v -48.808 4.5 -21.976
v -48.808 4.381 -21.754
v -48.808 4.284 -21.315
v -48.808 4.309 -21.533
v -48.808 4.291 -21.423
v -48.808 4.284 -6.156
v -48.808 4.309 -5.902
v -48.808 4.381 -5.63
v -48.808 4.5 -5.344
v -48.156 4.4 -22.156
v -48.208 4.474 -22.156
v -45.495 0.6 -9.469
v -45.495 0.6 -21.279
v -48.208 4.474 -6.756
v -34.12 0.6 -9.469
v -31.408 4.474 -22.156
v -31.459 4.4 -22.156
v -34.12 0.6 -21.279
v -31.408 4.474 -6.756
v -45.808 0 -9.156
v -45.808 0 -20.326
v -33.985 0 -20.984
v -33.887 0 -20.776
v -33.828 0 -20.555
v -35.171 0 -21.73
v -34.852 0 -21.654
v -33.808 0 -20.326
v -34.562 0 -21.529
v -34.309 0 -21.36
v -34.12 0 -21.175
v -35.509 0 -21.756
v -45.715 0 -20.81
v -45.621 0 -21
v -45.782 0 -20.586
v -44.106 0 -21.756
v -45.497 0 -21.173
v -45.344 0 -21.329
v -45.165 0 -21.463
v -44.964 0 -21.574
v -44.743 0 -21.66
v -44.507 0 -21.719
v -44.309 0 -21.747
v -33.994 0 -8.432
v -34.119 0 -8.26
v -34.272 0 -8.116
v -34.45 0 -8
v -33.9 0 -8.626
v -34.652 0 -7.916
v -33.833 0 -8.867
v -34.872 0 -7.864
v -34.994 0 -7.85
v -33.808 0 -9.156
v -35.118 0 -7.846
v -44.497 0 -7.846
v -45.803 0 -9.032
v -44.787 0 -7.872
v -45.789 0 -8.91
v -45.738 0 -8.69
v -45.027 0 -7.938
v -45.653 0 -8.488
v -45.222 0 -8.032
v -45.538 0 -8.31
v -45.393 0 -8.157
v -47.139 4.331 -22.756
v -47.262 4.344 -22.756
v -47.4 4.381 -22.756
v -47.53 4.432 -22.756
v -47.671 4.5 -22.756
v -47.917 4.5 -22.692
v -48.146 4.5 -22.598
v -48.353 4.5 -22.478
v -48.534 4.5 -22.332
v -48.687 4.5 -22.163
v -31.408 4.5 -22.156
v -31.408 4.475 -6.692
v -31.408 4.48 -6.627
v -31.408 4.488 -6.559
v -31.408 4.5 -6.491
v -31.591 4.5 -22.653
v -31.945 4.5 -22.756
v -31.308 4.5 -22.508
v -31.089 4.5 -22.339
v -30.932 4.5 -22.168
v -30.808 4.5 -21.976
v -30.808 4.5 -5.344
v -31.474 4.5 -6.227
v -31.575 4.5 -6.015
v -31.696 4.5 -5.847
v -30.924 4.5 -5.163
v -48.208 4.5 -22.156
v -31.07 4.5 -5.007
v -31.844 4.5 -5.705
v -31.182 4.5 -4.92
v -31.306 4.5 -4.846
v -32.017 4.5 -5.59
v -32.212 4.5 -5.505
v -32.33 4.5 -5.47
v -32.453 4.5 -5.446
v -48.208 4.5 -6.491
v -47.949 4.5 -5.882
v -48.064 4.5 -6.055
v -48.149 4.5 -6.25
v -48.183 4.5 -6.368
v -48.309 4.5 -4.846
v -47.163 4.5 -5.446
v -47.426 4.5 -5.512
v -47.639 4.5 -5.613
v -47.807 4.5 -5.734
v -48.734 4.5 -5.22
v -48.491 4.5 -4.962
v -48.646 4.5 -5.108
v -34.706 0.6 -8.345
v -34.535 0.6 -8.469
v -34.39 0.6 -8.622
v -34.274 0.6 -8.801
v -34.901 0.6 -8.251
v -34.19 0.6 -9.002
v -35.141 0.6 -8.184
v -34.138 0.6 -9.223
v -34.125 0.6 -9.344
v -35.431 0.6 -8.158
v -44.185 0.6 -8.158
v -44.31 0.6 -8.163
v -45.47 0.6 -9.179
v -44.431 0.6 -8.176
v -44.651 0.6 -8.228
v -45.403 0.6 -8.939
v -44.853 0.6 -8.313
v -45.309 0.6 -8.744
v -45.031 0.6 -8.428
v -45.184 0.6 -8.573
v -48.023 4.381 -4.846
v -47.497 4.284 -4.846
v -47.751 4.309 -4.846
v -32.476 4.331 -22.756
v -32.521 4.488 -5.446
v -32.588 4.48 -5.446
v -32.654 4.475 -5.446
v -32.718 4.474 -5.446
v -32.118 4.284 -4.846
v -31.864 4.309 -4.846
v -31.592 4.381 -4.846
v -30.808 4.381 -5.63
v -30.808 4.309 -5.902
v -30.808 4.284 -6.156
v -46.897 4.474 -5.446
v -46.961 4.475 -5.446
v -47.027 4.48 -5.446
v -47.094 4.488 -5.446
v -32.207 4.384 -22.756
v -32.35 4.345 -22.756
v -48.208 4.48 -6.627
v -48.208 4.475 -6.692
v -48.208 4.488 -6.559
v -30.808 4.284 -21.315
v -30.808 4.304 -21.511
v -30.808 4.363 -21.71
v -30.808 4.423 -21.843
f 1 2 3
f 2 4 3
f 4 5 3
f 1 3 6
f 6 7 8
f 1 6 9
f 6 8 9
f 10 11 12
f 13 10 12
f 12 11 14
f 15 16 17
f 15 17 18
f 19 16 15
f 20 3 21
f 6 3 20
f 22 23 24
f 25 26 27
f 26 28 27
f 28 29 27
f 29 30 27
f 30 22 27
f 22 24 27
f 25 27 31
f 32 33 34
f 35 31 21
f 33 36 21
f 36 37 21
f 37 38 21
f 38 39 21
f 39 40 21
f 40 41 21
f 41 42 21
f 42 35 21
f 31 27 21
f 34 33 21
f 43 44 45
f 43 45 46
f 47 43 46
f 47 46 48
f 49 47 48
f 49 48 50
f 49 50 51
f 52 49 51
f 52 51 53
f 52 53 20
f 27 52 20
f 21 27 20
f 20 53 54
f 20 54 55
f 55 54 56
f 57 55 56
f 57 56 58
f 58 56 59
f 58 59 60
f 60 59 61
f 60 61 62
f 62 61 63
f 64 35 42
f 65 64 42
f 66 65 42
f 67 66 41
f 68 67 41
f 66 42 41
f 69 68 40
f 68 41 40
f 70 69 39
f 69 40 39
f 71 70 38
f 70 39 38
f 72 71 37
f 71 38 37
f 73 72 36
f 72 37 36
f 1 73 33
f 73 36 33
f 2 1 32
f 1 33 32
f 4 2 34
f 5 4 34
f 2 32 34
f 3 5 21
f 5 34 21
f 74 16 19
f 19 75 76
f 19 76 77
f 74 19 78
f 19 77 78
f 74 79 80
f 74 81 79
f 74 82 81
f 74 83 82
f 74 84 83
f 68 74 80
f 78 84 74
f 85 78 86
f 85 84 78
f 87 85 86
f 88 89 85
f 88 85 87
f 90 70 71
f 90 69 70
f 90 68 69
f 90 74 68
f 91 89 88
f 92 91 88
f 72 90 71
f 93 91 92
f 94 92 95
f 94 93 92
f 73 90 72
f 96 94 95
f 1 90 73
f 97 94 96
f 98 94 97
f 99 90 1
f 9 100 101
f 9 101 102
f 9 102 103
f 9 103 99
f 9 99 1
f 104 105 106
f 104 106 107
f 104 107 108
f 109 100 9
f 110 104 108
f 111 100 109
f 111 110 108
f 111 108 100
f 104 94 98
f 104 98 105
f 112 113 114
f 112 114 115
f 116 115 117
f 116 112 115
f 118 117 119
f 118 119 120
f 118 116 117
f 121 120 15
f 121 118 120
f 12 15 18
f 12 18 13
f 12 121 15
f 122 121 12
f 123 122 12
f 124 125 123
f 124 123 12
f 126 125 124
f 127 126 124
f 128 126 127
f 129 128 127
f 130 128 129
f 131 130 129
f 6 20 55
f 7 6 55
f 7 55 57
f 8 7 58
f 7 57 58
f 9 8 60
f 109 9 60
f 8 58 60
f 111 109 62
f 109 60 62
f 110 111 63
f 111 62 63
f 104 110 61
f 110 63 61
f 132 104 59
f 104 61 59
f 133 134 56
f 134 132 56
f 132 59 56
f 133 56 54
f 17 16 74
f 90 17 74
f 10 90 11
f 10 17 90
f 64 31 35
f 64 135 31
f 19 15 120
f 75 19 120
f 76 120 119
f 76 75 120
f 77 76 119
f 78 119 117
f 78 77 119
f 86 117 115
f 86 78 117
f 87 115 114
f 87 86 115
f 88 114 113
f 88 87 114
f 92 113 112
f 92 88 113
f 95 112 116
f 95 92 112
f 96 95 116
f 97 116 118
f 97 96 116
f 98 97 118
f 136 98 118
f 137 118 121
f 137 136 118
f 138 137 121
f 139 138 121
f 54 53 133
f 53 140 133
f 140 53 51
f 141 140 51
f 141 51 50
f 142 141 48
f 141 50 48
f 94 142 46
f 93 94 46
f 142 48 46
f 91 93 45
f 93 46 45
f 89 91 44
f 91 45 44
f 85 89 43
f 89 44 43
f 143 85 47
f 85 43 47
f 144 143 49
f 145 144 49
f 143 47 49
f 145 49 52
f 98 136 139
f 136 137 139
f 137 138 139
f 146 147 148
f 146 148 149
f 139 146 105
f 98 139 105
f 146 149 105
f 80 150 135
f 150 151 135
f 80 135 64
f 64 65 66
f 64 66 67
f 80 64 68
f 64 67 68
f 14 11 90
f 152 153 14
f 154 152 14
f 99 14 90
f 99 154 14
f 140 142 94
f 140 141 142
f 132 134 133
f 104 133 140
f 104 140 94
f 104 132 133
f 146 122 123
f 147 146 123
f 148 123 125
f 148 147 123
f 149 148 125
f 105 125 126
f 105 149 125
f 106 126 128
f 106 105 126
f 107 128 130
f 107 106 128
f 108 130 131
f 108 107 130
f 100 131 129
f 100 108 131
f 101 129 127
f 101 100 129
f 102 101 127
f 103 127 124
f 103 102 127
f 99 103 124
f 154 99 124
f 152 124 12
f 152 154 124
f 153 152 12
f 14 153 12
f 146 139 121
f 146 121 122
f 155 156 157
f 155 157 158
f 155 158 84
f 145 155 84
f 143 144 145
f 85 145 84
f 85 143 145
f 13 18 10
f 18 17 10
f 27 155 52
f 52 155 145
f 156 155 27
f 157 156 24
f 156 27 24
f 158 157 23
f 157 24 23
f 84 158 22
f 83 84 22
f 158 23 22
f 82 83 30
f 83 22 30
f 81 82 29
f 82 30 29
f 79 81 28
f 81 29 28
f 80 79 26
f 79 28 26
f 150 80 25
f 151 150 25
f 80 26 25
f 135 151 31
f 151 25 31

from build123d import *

# Parameters (mm, degrees)
SKETCH1_W            = 5.409999999999997
SKETCH1_H            = 5.409999999999997
SKETCH1_W_2          = 4.549942703341507
SKETCH1_H_2          = 4.549942703341509
SKETCH1_W_3          = 0.4399999999999977
BOSS_EXTRUDE8_DEPTH  = 8.9
SKETCH2_W            = 0.24999999999999645
SKETCH2_H            = 1.5849393526398075
SKETCH2_W_2          = 0.25
CUT_EXTRUDE1_DEPTH   = 1
SKETCH3_W            = 2.0000000000000036
SKETCH3_H            = 0.1681942632906388
BOSS_EXTRUDE9_DEPTH  = 0.44
BOSS_EXTRUDE10_DEPTH = 2
SKETCH6_W            = 3.0119840570828487
SKETCH6_H            = 5.999459520470431
CUT_EXTRUDE2_DEPTH   = 10
SKETCH8_W            = 9
SKETCH8_H            = 17.909999999999997
BOSS_EXTRUDE11_DEPTH = 4.5
CHAMFER3_SIZE        = 3
CHAMFER3_SIZE2       = 4.2844440202263625
CHAMFER4_SIZE        = 1
CHAMFER4_SIZE2       = 4.331475874284207
SKETCH12_W           = 8.408099926910044
SKETCH12_H           = 4.631365679829861
CUT_EXTRUDE3_DEPTH   = 30
SHELL6_T             = -0.6
FILLET1_R            = 1.6
FILLET4_R            = 1.6


# Read off the part's stored shape, not the designer's step: Mirror5
with BuildPart() as part:
    # Sketch1 → Boss-Extrude8 (new body)
    # profile 1 of 10: a face of its own
    with BuildSketch(Plane(origin=(0, 0, 0), x_dir=(1, 0, 0), z_dir=(0, 1, 0))):
        with Locations((-39.80770033929644, 14.55082776302726)):
            Rectangle(SKETCH1_W, SKETCH1_H)
        with Locations((-39.79772898762569, 14.560799114698018)):
            Rectangle(SKETCH1_W_2, SKETCH1_H_2, mode=Mode.SUBTRACT)
    # profile 2 of 10: a face of its own
    with BuildSketch(Plane(origin=(0, 0, 0), x_dir=(1, 0, 0), z_dir=(0, 1, 0))):
        with Locations((-39.80770033929644, 14.560799114698018)):
            Rectangle(SKETCH1_W_3, SKETCH1_H_2)
    # profile 3 of 10: a face of its own
    with BuildSketch(Plane(origin=(0, 0, 0), x_dir=(1, 0, 0), z_dir=(0, 1, 0))):
        with BuildLine():
            ThreePointArc((-42.09264304263795, 17.25582776302726), (-42.302671690967195, 17.47082776302726), (-42.51270033929644, 17.25582776302726))
            Line((-42.51270033929644, 17.25582776302726), (-42.09264304263795, 17.25582776302726))
        make_face()
    # profile 4 of 10: a face of its own
    with BuildSketch(Plane(origin=(0, 0, 0), x_dir=(1, 0, 0), z_dir=(0, 1, 0))):
        with BuildLine():
            ThreePointArc((-42.51270033929644, 17.255827763027263), (-42.72270033929644, 17.035827763027264), (-42.51270033929644, 16.815827763027265))
            Line((-42.51270033929644, 16.815827763027265), (-42.51270033929644, 17.25582776302726))
        make_face()
    # profile 5 of 10: a face of its own
    with BuildSketch(Plane(origin=(0, 0, 0), x_dir=(1, 0, 0), z_dir=(0, 1, 0))):
        with BuildLine():
            ThreePointArc((-42.51270033929644, 12.285827763027262), (-42.722700339296445, 12.065827763027261), (-42.51270033929644, 11.84582776302726))
            Line((-42.51270033929644, 11.845827763027263), (-42.51270033929644, 12.285827763027262))
        make_face()
    # profile 6 of 10: a face of its own
    with BuildSketch(Plane(origin=(0, 0, 0), x_dir=(1, 0, 0), z_dir=(0, 1, 0))):
        with BuildLine():
            Line((-42.09264304263795, 11.845827763027263), (-42.51270033929644, 11.845827763027263))
            ThreePointArc((-42.51270033929644, 11.845827763027263), (-42.302671690967195, 11.630827763027263), (-42.09264304263795, 11.845827763027263))
        make_face()
    # profile 7 of 10: a face of its own
    with BuildSketch(Plane(origin=(0, 0, 0), x_dir=(1, 0, 0), z_dir=(0, 1, 0))):
        with BuildLine():
            Line((-37.10270033929644, 11.845827763027263), (-37.522757635954925, 11.845827763027263))
            ThreePointArc((-37.522757635954925, 11.845827763027263), (-37.31272898762568, 11.630827763027263), (-37.10270033929644, 11.845827763027263))
        make_face()
    # profile 8 of 10: a face of its own
    with BuildSketch(Plane(origin=(0, 0, 0), x_dir=(1, 0, 0), z_dir=(0, 1, 0))):
        with BuildLine():
            Line((-37.10270033929644, 12.285827763027264), (-37.10270033929644, 11.845827763027263))
            ThreePointArc((-37.10270033929644, 11.845827763027259), (-36.89270033929645, 12.065827763027261), (-37.10270033929644, 12.285827763027264))
        make_face()
    # profile 9 of 10: a face of its own
    with BuildSketch(Plane(origin=(0, 0, 0), x_dir=(1, 0, 0), z_dir=(0, 1, 0))):
        with BuildLine():
            ThreePointArc((-37.10270033929644, 17.25582776302726), (-37.31272898762568, 17.47082776302726), (-37.522757635954925, 17.25582776302726))
            Line((-37.522757635954925, 17.25582776302726), (-37.10270033929644, 17.25582776302726))
        make_face()
    # profile 10 of 10: a face of its own
    with BuildSketch(Plane(origin=(0, 0, 0), x_dir=(1, 0, 0), z_dir=(0, 1, 0))):
        with BuildLine():
            Line((-37.10270033929644, 17.25582776302726), (-37.10270033929644, 16.815827763027265))
            ThreePointArc((-37.10270033929644, 16.815827763027265), (-36.89270033929645, 17.035827763027264), (-37.10270033929644, 17.255827763027263))
        make_face()
    extrude(amount=BOSS_EXTRUDE8_DEPTH)

    # Sketch2 → Cut-Extrude1 (cut)
    with BuildSketch(Plane(origin=(-37.10270033929644, 0, 0), x_dir=(0, 0, -1), z_dir=(1, 0, 0))):
        Polygon((13.55082776302726, 7.315060647360192), (13.300827763027263, 7.315060647360192), (13.300827763027263, 3.9000000000000004), (13.550827763027263, 3.9), align=None)
        with Locations((13.42582776302726, 8.107530323680097)):
            Rectangle(SKETCH2_W, SKETCH2_H)
        with Locations((15.675827763027263, 8.107530323680097)):
            Rectangle(SKETCH2_W_2, SKETCH2_H)
        Polygon((15.800827763027263, 7.315060647360192), (15.550827763027263, 7.315060647360192), (15.550827763027264, 3.9000000000000004), (15.800827763027263, 3.9), align=None)
    extrude(amount=-CUT_EXTRUDE1_DEPTH, mode=Mode.SUBTRACT)

    # Sketch3 → Boss-Extrude9 (add)
    with BuildSketch(Plane(origin=(-37.10270033929644, 0, 0), x_dir=(0, 0, -1), z_dir=(1, 0, 0))):
        with Locations((14.55082776302726, 6.984097131645319)):
            Rectangle(SKETCH3_W, SKETCH3_H)
    extrude(amount=BOSS_EXTRUDE9_DEPTH)

    # Sketch5 → Boss-Extrude10 (add)
    with BuildSketch(Plane.XY.offset(-13.55082776302726)):
        Polygon((-36.662700339296435, 7.068194263290638), (-37.10270033929644, 8.9), (-37.10270033929644, 7.068194263290638), align=None)
    extrude(amount=-BOSS_EXTRUDE10_DEPTH)

    # Sketch6 → Cut-Extrude2 (cut)
    with BuildSketch(Plane(origin=(0, 8.9, 0), x_dir=(1, 0, 0), z_dir=(0, 1, 0))):
        with Locations((-41.31369236783786, 14.541370123902443)):
            Rectangle(SKETCH6_W, SKETCH6_H)
    extrude(amount=-CUT_EXTRUDE2_DEPTH, mode=Mode.SUBTRACT)

    # Sketch8 → Boss-Extrude11 (add)
    with BuildSketch(Plane.XZ):
        with Locations((-35.30770033929644, -13.80082776302726)):
            Rectangle(SKETCH8_W, SKETCH8_H)
    extrude(amount=-BOSS_EXTRUDE11_DEPTH)

    # Chamfer3
    chamfer3_edges = [part.edges().sort_by_distance(p)[0] for p in [
        (-30.80770033929644, 0, -13.80082776302726),
        (-35.30770033929644, 0, -4.845827763027263),
    ]]
    chamfer3_side = [part.faces().sort_by_distance(p)[0] for p in [
        (-35.30770033929644, 0, -13.80082776302726),
    ]]
    chamfer(chamfer3_edges, length=CHAMFER3_SIZE, length2=CHAMFER3_SIZE2, reference=chamfer3_side[0])

    # Chamfer4
    chamfer4_edges = [part.edges().sort_by_distance(p)[0] for p in [
        (-36.80770033929644, 0, -22.75582776302726),
    ]]
    chamfer4_side = [part.faces().sort_by_distance(p)[0] for p in [
        (-36.80770033929644, 0, -15.300827763027259),
    ]]
    chamfer(chamfer4_edges, length=CHAMFER4_SIZE, length2=CHAMFER4_SIZE2, reference=chamfer4_side[0])

    # Sketch12 → Cut-Extrude3 (cut)
    with BuildSketch(Plane.ZY.offset(39.80770033929644)):
        with Locations((-13.543811608056215, 6.81568283991493)):
            Rectangle(SKETCH12_W, SKETCH12_H)
    extrude(amount=-CUT_EXTRUDE3_DEPTH, mode=Mode.SUBTRACT)

    # Shell6
    shell6_openings = [part.faces().sort_by_distance(p)[0] for p in [
        (-39.807700339, 2.347603862, -14.251531758),
        (-35.307700339, 4.5, -13.800827763),
    ]]
    offset(amount=SHELL6_T, openings=shell6_openings, kind=Kind.INTERSECTION)

    # Mirror5: part across plane


with BuildPart() as part_1:
    add(part.part)
    add(part.part.mirror(Plane(origin=(-39.80770033929644, -1.1000000000000003, -17.541099884137658), x_dir=(0, 0, 1), z_dir=(1, 0, 0))))

    # Fillet1
    # the kernel refuses this fillet: 1.6 mm, written as the material it takes off along each edge
    with BuildSketch(Plane(origin=(-35.22184592572937, -2.0196092005073596, -9.259973349460195), x_dir=(0.2853788331334057, 0.40756321170586113, -0.867439421552548), z_dir=(0.4975428121645219, 0.7105647754616313, 0.4975428121645219))) as fillet1_piece_1:
        with BuildLine():
            CenterArc((FILLET1_R * 0.710564775462, FILLET1_R), FILLET1_R, 199.20747972534394, 70.79252027465611)
            Line((-FILLET1_R * 0.233768654558, FILLET1_R * 0.671010071663), (0, 0))
            Line((0, 0), (FILLET1_R * 0.710564775462, -5e-17))
        make_face()
    extrude(amount=11.714150079890267, mode=Mode.SUBTRACT)
    with BuildSketch(Plane(origin=(-44.39355475286351, -2.0196092005073587, -9.259973349460195), x_dir=(0.8674394215525482, 0.40756321170586235, 0.2853788331334039), z_dir=(-0.4975428121645219, 0.7105647754616313, 0.4975428121645219))) as fillet1_piece_2:
        with BuildLine():
            CenterArc((FILLET1_R * 0.710564775462, FILLET1_R), FILLET1_R, 199.20747972534403, 70.792520274656)
            Line((-FILLET1_R * 0.233768654558, FILLET1_R * 0.671010071663), (0, 0))
            Line((0, 0), (FILLET1_R * 0.710564775462, 1e-17))
        make_face()
    extrude(amount=11.714150079890267, mode=Mode.SUBTRACT)
    with BuildSketch(Plane(origin=(-43.82767365962377, -2.8277711558707384, -21.102985351354345), x_dir=(-0.10658333920242485, 0.1522167834338588, 0.9825833515002738), z_dir=(-0.5635866571713927, 0.8048851610657796, -0.1858223811990618))) as fillet1_piece_3:
        with BuildLine():
            CenterArc((FILLET1_R * 0.87831509781, FILLET1_R), FILLET1_R, 187.41334827823792, 82.58665172176217)
            Line((-FILLET1_R * 0.11332603197, FILLET1_R * 0.870973375896), (0, 0))
            Line((0, 0), (FILLET1_R * 0.87831509781, -2e-17))
        make_face()
    extrude(amount=12.349570861520077, mode=Mode.SUBTRACT)
    with BuildSketch(Plane(origin=(-35.78772701896911, -2.8277711558707392, -21.102985351354345), x_dir=(0.10658333920242458, 0.15221678343385903, 0.9825833515002738), z_dir=(0.5635866571713927, 0.8048851610657796, -0.1858223811990618))) as fillet1_piece_4:
        with BuildLine():
            CenterArc((FILLET1_R * 0.87831509781, -FILLET1_R), FILLET1_R, 89.99999999999993, 82.58665172176215)
            Line((-FILLET1_R * 0.11332603197, -FILLET1_R * 0.870973375896), (0, 0))
            Line((0, 0), (FILLET1_R * 0.87831509781, -1e-17))
        make_face()
    extrude(amount=12.349570861520073, mode=Mode.SUBTRACT)

    # Fillet4
    # the kernel refuses this fillet: 1.6 mm, written as the material it adds along each edge
    with BuildSketch(Plane(origin=(-49.62184592572936, 6.4932324940611, -4.031682176594339), x_dir=(0.867439421552548, 0.40756321170586235, 0.28537883313340373), z_dir=(0.4975428121645219, -0.7105647754616313, -0.4975428121645219))) as fillet4_piece_1_section:
        with BuildLine():
            CenterArc((FILLET4_R * 0.710564775462, -FILLET4_R), FILLET4_R, 89.99999999999997, 70.79252027465614)
            Line((-FILLET4_R * 0.233768654558, -FILLET4_R * 0.671010071663), (0, 0))
            Line((0, 0), (FILLET4_R * 0.710564775462, -1e-17))
        make_face()
    fillet4_piece_1 = extrude(amount=11.13598924099177, mode=Mode.PRIVATE)
    fillet4_piece_1 = split(fillet4_piece_1, bisect_by=Plane(origin=(-46.579824148031086, 4.5, -7.073703954292618), z_dir=(0, -1, 0)), keep=Keep.TOP, mode=Mode.PRIVATE)
    fillet4_piece_1 = split(fillet4_piece_1, bisect_by=Plane(origin=(-46.579824148031086, 0.6, -7.073703954292618), z_dir=(0, 1, 0)), keep=Keep.TOP, mode=Mode.PRIVATE)
    add(fillet4_piece_1)
    with BuildSketch(Plane(origin=(-29.993554752863513, 6.4932324940611, -4.031682176594337), x_dir=(-0.867439421552548, 0.40756321170586274, 0.28537883313340323), z_dir=(-0.4975428121645219, -0.7105647754616313, -0.4975428121645219))) as fillet4_piece_2_section:
        with BuildLine():
            CenterArc((FILLET4_R * 0.710564775462, FILLET4_R), FILLET4_R, 199.20747972534394, 70.79252027465606)
            Line((-FILLET4_R * 0.233768654558, FILLET4_R * 0.671010071663), (0, 0))
            Line((0, 0), (FILLET4_R * 0.710564775462, -6e-17))
        make_face()
    fillet4_piece_2 = extrude(amount=11.13598924099177, mode=Mode.PRIVATE)
    fillet4_piece_2 = split(fillet4_piece_2, bisect_by=Plane(origin=(-33.035576530561805, 4.5, -7.07370395429263), z_dir=(0, -1, 0)), keep=Keep.TOP, mode=Mode.PRIVATE)
    fillet4_piece_2 = split(fillet4_piece_2, bisect_by=Plane(origin=(-33.035576530561805, 0.6, -7.07370395429263), z_dir=(0, 1, 0)), keep=Keep.TOP, mode=Mode.PRIVATE)
    add(fillet4_piece_2)


solid = part_1.part
